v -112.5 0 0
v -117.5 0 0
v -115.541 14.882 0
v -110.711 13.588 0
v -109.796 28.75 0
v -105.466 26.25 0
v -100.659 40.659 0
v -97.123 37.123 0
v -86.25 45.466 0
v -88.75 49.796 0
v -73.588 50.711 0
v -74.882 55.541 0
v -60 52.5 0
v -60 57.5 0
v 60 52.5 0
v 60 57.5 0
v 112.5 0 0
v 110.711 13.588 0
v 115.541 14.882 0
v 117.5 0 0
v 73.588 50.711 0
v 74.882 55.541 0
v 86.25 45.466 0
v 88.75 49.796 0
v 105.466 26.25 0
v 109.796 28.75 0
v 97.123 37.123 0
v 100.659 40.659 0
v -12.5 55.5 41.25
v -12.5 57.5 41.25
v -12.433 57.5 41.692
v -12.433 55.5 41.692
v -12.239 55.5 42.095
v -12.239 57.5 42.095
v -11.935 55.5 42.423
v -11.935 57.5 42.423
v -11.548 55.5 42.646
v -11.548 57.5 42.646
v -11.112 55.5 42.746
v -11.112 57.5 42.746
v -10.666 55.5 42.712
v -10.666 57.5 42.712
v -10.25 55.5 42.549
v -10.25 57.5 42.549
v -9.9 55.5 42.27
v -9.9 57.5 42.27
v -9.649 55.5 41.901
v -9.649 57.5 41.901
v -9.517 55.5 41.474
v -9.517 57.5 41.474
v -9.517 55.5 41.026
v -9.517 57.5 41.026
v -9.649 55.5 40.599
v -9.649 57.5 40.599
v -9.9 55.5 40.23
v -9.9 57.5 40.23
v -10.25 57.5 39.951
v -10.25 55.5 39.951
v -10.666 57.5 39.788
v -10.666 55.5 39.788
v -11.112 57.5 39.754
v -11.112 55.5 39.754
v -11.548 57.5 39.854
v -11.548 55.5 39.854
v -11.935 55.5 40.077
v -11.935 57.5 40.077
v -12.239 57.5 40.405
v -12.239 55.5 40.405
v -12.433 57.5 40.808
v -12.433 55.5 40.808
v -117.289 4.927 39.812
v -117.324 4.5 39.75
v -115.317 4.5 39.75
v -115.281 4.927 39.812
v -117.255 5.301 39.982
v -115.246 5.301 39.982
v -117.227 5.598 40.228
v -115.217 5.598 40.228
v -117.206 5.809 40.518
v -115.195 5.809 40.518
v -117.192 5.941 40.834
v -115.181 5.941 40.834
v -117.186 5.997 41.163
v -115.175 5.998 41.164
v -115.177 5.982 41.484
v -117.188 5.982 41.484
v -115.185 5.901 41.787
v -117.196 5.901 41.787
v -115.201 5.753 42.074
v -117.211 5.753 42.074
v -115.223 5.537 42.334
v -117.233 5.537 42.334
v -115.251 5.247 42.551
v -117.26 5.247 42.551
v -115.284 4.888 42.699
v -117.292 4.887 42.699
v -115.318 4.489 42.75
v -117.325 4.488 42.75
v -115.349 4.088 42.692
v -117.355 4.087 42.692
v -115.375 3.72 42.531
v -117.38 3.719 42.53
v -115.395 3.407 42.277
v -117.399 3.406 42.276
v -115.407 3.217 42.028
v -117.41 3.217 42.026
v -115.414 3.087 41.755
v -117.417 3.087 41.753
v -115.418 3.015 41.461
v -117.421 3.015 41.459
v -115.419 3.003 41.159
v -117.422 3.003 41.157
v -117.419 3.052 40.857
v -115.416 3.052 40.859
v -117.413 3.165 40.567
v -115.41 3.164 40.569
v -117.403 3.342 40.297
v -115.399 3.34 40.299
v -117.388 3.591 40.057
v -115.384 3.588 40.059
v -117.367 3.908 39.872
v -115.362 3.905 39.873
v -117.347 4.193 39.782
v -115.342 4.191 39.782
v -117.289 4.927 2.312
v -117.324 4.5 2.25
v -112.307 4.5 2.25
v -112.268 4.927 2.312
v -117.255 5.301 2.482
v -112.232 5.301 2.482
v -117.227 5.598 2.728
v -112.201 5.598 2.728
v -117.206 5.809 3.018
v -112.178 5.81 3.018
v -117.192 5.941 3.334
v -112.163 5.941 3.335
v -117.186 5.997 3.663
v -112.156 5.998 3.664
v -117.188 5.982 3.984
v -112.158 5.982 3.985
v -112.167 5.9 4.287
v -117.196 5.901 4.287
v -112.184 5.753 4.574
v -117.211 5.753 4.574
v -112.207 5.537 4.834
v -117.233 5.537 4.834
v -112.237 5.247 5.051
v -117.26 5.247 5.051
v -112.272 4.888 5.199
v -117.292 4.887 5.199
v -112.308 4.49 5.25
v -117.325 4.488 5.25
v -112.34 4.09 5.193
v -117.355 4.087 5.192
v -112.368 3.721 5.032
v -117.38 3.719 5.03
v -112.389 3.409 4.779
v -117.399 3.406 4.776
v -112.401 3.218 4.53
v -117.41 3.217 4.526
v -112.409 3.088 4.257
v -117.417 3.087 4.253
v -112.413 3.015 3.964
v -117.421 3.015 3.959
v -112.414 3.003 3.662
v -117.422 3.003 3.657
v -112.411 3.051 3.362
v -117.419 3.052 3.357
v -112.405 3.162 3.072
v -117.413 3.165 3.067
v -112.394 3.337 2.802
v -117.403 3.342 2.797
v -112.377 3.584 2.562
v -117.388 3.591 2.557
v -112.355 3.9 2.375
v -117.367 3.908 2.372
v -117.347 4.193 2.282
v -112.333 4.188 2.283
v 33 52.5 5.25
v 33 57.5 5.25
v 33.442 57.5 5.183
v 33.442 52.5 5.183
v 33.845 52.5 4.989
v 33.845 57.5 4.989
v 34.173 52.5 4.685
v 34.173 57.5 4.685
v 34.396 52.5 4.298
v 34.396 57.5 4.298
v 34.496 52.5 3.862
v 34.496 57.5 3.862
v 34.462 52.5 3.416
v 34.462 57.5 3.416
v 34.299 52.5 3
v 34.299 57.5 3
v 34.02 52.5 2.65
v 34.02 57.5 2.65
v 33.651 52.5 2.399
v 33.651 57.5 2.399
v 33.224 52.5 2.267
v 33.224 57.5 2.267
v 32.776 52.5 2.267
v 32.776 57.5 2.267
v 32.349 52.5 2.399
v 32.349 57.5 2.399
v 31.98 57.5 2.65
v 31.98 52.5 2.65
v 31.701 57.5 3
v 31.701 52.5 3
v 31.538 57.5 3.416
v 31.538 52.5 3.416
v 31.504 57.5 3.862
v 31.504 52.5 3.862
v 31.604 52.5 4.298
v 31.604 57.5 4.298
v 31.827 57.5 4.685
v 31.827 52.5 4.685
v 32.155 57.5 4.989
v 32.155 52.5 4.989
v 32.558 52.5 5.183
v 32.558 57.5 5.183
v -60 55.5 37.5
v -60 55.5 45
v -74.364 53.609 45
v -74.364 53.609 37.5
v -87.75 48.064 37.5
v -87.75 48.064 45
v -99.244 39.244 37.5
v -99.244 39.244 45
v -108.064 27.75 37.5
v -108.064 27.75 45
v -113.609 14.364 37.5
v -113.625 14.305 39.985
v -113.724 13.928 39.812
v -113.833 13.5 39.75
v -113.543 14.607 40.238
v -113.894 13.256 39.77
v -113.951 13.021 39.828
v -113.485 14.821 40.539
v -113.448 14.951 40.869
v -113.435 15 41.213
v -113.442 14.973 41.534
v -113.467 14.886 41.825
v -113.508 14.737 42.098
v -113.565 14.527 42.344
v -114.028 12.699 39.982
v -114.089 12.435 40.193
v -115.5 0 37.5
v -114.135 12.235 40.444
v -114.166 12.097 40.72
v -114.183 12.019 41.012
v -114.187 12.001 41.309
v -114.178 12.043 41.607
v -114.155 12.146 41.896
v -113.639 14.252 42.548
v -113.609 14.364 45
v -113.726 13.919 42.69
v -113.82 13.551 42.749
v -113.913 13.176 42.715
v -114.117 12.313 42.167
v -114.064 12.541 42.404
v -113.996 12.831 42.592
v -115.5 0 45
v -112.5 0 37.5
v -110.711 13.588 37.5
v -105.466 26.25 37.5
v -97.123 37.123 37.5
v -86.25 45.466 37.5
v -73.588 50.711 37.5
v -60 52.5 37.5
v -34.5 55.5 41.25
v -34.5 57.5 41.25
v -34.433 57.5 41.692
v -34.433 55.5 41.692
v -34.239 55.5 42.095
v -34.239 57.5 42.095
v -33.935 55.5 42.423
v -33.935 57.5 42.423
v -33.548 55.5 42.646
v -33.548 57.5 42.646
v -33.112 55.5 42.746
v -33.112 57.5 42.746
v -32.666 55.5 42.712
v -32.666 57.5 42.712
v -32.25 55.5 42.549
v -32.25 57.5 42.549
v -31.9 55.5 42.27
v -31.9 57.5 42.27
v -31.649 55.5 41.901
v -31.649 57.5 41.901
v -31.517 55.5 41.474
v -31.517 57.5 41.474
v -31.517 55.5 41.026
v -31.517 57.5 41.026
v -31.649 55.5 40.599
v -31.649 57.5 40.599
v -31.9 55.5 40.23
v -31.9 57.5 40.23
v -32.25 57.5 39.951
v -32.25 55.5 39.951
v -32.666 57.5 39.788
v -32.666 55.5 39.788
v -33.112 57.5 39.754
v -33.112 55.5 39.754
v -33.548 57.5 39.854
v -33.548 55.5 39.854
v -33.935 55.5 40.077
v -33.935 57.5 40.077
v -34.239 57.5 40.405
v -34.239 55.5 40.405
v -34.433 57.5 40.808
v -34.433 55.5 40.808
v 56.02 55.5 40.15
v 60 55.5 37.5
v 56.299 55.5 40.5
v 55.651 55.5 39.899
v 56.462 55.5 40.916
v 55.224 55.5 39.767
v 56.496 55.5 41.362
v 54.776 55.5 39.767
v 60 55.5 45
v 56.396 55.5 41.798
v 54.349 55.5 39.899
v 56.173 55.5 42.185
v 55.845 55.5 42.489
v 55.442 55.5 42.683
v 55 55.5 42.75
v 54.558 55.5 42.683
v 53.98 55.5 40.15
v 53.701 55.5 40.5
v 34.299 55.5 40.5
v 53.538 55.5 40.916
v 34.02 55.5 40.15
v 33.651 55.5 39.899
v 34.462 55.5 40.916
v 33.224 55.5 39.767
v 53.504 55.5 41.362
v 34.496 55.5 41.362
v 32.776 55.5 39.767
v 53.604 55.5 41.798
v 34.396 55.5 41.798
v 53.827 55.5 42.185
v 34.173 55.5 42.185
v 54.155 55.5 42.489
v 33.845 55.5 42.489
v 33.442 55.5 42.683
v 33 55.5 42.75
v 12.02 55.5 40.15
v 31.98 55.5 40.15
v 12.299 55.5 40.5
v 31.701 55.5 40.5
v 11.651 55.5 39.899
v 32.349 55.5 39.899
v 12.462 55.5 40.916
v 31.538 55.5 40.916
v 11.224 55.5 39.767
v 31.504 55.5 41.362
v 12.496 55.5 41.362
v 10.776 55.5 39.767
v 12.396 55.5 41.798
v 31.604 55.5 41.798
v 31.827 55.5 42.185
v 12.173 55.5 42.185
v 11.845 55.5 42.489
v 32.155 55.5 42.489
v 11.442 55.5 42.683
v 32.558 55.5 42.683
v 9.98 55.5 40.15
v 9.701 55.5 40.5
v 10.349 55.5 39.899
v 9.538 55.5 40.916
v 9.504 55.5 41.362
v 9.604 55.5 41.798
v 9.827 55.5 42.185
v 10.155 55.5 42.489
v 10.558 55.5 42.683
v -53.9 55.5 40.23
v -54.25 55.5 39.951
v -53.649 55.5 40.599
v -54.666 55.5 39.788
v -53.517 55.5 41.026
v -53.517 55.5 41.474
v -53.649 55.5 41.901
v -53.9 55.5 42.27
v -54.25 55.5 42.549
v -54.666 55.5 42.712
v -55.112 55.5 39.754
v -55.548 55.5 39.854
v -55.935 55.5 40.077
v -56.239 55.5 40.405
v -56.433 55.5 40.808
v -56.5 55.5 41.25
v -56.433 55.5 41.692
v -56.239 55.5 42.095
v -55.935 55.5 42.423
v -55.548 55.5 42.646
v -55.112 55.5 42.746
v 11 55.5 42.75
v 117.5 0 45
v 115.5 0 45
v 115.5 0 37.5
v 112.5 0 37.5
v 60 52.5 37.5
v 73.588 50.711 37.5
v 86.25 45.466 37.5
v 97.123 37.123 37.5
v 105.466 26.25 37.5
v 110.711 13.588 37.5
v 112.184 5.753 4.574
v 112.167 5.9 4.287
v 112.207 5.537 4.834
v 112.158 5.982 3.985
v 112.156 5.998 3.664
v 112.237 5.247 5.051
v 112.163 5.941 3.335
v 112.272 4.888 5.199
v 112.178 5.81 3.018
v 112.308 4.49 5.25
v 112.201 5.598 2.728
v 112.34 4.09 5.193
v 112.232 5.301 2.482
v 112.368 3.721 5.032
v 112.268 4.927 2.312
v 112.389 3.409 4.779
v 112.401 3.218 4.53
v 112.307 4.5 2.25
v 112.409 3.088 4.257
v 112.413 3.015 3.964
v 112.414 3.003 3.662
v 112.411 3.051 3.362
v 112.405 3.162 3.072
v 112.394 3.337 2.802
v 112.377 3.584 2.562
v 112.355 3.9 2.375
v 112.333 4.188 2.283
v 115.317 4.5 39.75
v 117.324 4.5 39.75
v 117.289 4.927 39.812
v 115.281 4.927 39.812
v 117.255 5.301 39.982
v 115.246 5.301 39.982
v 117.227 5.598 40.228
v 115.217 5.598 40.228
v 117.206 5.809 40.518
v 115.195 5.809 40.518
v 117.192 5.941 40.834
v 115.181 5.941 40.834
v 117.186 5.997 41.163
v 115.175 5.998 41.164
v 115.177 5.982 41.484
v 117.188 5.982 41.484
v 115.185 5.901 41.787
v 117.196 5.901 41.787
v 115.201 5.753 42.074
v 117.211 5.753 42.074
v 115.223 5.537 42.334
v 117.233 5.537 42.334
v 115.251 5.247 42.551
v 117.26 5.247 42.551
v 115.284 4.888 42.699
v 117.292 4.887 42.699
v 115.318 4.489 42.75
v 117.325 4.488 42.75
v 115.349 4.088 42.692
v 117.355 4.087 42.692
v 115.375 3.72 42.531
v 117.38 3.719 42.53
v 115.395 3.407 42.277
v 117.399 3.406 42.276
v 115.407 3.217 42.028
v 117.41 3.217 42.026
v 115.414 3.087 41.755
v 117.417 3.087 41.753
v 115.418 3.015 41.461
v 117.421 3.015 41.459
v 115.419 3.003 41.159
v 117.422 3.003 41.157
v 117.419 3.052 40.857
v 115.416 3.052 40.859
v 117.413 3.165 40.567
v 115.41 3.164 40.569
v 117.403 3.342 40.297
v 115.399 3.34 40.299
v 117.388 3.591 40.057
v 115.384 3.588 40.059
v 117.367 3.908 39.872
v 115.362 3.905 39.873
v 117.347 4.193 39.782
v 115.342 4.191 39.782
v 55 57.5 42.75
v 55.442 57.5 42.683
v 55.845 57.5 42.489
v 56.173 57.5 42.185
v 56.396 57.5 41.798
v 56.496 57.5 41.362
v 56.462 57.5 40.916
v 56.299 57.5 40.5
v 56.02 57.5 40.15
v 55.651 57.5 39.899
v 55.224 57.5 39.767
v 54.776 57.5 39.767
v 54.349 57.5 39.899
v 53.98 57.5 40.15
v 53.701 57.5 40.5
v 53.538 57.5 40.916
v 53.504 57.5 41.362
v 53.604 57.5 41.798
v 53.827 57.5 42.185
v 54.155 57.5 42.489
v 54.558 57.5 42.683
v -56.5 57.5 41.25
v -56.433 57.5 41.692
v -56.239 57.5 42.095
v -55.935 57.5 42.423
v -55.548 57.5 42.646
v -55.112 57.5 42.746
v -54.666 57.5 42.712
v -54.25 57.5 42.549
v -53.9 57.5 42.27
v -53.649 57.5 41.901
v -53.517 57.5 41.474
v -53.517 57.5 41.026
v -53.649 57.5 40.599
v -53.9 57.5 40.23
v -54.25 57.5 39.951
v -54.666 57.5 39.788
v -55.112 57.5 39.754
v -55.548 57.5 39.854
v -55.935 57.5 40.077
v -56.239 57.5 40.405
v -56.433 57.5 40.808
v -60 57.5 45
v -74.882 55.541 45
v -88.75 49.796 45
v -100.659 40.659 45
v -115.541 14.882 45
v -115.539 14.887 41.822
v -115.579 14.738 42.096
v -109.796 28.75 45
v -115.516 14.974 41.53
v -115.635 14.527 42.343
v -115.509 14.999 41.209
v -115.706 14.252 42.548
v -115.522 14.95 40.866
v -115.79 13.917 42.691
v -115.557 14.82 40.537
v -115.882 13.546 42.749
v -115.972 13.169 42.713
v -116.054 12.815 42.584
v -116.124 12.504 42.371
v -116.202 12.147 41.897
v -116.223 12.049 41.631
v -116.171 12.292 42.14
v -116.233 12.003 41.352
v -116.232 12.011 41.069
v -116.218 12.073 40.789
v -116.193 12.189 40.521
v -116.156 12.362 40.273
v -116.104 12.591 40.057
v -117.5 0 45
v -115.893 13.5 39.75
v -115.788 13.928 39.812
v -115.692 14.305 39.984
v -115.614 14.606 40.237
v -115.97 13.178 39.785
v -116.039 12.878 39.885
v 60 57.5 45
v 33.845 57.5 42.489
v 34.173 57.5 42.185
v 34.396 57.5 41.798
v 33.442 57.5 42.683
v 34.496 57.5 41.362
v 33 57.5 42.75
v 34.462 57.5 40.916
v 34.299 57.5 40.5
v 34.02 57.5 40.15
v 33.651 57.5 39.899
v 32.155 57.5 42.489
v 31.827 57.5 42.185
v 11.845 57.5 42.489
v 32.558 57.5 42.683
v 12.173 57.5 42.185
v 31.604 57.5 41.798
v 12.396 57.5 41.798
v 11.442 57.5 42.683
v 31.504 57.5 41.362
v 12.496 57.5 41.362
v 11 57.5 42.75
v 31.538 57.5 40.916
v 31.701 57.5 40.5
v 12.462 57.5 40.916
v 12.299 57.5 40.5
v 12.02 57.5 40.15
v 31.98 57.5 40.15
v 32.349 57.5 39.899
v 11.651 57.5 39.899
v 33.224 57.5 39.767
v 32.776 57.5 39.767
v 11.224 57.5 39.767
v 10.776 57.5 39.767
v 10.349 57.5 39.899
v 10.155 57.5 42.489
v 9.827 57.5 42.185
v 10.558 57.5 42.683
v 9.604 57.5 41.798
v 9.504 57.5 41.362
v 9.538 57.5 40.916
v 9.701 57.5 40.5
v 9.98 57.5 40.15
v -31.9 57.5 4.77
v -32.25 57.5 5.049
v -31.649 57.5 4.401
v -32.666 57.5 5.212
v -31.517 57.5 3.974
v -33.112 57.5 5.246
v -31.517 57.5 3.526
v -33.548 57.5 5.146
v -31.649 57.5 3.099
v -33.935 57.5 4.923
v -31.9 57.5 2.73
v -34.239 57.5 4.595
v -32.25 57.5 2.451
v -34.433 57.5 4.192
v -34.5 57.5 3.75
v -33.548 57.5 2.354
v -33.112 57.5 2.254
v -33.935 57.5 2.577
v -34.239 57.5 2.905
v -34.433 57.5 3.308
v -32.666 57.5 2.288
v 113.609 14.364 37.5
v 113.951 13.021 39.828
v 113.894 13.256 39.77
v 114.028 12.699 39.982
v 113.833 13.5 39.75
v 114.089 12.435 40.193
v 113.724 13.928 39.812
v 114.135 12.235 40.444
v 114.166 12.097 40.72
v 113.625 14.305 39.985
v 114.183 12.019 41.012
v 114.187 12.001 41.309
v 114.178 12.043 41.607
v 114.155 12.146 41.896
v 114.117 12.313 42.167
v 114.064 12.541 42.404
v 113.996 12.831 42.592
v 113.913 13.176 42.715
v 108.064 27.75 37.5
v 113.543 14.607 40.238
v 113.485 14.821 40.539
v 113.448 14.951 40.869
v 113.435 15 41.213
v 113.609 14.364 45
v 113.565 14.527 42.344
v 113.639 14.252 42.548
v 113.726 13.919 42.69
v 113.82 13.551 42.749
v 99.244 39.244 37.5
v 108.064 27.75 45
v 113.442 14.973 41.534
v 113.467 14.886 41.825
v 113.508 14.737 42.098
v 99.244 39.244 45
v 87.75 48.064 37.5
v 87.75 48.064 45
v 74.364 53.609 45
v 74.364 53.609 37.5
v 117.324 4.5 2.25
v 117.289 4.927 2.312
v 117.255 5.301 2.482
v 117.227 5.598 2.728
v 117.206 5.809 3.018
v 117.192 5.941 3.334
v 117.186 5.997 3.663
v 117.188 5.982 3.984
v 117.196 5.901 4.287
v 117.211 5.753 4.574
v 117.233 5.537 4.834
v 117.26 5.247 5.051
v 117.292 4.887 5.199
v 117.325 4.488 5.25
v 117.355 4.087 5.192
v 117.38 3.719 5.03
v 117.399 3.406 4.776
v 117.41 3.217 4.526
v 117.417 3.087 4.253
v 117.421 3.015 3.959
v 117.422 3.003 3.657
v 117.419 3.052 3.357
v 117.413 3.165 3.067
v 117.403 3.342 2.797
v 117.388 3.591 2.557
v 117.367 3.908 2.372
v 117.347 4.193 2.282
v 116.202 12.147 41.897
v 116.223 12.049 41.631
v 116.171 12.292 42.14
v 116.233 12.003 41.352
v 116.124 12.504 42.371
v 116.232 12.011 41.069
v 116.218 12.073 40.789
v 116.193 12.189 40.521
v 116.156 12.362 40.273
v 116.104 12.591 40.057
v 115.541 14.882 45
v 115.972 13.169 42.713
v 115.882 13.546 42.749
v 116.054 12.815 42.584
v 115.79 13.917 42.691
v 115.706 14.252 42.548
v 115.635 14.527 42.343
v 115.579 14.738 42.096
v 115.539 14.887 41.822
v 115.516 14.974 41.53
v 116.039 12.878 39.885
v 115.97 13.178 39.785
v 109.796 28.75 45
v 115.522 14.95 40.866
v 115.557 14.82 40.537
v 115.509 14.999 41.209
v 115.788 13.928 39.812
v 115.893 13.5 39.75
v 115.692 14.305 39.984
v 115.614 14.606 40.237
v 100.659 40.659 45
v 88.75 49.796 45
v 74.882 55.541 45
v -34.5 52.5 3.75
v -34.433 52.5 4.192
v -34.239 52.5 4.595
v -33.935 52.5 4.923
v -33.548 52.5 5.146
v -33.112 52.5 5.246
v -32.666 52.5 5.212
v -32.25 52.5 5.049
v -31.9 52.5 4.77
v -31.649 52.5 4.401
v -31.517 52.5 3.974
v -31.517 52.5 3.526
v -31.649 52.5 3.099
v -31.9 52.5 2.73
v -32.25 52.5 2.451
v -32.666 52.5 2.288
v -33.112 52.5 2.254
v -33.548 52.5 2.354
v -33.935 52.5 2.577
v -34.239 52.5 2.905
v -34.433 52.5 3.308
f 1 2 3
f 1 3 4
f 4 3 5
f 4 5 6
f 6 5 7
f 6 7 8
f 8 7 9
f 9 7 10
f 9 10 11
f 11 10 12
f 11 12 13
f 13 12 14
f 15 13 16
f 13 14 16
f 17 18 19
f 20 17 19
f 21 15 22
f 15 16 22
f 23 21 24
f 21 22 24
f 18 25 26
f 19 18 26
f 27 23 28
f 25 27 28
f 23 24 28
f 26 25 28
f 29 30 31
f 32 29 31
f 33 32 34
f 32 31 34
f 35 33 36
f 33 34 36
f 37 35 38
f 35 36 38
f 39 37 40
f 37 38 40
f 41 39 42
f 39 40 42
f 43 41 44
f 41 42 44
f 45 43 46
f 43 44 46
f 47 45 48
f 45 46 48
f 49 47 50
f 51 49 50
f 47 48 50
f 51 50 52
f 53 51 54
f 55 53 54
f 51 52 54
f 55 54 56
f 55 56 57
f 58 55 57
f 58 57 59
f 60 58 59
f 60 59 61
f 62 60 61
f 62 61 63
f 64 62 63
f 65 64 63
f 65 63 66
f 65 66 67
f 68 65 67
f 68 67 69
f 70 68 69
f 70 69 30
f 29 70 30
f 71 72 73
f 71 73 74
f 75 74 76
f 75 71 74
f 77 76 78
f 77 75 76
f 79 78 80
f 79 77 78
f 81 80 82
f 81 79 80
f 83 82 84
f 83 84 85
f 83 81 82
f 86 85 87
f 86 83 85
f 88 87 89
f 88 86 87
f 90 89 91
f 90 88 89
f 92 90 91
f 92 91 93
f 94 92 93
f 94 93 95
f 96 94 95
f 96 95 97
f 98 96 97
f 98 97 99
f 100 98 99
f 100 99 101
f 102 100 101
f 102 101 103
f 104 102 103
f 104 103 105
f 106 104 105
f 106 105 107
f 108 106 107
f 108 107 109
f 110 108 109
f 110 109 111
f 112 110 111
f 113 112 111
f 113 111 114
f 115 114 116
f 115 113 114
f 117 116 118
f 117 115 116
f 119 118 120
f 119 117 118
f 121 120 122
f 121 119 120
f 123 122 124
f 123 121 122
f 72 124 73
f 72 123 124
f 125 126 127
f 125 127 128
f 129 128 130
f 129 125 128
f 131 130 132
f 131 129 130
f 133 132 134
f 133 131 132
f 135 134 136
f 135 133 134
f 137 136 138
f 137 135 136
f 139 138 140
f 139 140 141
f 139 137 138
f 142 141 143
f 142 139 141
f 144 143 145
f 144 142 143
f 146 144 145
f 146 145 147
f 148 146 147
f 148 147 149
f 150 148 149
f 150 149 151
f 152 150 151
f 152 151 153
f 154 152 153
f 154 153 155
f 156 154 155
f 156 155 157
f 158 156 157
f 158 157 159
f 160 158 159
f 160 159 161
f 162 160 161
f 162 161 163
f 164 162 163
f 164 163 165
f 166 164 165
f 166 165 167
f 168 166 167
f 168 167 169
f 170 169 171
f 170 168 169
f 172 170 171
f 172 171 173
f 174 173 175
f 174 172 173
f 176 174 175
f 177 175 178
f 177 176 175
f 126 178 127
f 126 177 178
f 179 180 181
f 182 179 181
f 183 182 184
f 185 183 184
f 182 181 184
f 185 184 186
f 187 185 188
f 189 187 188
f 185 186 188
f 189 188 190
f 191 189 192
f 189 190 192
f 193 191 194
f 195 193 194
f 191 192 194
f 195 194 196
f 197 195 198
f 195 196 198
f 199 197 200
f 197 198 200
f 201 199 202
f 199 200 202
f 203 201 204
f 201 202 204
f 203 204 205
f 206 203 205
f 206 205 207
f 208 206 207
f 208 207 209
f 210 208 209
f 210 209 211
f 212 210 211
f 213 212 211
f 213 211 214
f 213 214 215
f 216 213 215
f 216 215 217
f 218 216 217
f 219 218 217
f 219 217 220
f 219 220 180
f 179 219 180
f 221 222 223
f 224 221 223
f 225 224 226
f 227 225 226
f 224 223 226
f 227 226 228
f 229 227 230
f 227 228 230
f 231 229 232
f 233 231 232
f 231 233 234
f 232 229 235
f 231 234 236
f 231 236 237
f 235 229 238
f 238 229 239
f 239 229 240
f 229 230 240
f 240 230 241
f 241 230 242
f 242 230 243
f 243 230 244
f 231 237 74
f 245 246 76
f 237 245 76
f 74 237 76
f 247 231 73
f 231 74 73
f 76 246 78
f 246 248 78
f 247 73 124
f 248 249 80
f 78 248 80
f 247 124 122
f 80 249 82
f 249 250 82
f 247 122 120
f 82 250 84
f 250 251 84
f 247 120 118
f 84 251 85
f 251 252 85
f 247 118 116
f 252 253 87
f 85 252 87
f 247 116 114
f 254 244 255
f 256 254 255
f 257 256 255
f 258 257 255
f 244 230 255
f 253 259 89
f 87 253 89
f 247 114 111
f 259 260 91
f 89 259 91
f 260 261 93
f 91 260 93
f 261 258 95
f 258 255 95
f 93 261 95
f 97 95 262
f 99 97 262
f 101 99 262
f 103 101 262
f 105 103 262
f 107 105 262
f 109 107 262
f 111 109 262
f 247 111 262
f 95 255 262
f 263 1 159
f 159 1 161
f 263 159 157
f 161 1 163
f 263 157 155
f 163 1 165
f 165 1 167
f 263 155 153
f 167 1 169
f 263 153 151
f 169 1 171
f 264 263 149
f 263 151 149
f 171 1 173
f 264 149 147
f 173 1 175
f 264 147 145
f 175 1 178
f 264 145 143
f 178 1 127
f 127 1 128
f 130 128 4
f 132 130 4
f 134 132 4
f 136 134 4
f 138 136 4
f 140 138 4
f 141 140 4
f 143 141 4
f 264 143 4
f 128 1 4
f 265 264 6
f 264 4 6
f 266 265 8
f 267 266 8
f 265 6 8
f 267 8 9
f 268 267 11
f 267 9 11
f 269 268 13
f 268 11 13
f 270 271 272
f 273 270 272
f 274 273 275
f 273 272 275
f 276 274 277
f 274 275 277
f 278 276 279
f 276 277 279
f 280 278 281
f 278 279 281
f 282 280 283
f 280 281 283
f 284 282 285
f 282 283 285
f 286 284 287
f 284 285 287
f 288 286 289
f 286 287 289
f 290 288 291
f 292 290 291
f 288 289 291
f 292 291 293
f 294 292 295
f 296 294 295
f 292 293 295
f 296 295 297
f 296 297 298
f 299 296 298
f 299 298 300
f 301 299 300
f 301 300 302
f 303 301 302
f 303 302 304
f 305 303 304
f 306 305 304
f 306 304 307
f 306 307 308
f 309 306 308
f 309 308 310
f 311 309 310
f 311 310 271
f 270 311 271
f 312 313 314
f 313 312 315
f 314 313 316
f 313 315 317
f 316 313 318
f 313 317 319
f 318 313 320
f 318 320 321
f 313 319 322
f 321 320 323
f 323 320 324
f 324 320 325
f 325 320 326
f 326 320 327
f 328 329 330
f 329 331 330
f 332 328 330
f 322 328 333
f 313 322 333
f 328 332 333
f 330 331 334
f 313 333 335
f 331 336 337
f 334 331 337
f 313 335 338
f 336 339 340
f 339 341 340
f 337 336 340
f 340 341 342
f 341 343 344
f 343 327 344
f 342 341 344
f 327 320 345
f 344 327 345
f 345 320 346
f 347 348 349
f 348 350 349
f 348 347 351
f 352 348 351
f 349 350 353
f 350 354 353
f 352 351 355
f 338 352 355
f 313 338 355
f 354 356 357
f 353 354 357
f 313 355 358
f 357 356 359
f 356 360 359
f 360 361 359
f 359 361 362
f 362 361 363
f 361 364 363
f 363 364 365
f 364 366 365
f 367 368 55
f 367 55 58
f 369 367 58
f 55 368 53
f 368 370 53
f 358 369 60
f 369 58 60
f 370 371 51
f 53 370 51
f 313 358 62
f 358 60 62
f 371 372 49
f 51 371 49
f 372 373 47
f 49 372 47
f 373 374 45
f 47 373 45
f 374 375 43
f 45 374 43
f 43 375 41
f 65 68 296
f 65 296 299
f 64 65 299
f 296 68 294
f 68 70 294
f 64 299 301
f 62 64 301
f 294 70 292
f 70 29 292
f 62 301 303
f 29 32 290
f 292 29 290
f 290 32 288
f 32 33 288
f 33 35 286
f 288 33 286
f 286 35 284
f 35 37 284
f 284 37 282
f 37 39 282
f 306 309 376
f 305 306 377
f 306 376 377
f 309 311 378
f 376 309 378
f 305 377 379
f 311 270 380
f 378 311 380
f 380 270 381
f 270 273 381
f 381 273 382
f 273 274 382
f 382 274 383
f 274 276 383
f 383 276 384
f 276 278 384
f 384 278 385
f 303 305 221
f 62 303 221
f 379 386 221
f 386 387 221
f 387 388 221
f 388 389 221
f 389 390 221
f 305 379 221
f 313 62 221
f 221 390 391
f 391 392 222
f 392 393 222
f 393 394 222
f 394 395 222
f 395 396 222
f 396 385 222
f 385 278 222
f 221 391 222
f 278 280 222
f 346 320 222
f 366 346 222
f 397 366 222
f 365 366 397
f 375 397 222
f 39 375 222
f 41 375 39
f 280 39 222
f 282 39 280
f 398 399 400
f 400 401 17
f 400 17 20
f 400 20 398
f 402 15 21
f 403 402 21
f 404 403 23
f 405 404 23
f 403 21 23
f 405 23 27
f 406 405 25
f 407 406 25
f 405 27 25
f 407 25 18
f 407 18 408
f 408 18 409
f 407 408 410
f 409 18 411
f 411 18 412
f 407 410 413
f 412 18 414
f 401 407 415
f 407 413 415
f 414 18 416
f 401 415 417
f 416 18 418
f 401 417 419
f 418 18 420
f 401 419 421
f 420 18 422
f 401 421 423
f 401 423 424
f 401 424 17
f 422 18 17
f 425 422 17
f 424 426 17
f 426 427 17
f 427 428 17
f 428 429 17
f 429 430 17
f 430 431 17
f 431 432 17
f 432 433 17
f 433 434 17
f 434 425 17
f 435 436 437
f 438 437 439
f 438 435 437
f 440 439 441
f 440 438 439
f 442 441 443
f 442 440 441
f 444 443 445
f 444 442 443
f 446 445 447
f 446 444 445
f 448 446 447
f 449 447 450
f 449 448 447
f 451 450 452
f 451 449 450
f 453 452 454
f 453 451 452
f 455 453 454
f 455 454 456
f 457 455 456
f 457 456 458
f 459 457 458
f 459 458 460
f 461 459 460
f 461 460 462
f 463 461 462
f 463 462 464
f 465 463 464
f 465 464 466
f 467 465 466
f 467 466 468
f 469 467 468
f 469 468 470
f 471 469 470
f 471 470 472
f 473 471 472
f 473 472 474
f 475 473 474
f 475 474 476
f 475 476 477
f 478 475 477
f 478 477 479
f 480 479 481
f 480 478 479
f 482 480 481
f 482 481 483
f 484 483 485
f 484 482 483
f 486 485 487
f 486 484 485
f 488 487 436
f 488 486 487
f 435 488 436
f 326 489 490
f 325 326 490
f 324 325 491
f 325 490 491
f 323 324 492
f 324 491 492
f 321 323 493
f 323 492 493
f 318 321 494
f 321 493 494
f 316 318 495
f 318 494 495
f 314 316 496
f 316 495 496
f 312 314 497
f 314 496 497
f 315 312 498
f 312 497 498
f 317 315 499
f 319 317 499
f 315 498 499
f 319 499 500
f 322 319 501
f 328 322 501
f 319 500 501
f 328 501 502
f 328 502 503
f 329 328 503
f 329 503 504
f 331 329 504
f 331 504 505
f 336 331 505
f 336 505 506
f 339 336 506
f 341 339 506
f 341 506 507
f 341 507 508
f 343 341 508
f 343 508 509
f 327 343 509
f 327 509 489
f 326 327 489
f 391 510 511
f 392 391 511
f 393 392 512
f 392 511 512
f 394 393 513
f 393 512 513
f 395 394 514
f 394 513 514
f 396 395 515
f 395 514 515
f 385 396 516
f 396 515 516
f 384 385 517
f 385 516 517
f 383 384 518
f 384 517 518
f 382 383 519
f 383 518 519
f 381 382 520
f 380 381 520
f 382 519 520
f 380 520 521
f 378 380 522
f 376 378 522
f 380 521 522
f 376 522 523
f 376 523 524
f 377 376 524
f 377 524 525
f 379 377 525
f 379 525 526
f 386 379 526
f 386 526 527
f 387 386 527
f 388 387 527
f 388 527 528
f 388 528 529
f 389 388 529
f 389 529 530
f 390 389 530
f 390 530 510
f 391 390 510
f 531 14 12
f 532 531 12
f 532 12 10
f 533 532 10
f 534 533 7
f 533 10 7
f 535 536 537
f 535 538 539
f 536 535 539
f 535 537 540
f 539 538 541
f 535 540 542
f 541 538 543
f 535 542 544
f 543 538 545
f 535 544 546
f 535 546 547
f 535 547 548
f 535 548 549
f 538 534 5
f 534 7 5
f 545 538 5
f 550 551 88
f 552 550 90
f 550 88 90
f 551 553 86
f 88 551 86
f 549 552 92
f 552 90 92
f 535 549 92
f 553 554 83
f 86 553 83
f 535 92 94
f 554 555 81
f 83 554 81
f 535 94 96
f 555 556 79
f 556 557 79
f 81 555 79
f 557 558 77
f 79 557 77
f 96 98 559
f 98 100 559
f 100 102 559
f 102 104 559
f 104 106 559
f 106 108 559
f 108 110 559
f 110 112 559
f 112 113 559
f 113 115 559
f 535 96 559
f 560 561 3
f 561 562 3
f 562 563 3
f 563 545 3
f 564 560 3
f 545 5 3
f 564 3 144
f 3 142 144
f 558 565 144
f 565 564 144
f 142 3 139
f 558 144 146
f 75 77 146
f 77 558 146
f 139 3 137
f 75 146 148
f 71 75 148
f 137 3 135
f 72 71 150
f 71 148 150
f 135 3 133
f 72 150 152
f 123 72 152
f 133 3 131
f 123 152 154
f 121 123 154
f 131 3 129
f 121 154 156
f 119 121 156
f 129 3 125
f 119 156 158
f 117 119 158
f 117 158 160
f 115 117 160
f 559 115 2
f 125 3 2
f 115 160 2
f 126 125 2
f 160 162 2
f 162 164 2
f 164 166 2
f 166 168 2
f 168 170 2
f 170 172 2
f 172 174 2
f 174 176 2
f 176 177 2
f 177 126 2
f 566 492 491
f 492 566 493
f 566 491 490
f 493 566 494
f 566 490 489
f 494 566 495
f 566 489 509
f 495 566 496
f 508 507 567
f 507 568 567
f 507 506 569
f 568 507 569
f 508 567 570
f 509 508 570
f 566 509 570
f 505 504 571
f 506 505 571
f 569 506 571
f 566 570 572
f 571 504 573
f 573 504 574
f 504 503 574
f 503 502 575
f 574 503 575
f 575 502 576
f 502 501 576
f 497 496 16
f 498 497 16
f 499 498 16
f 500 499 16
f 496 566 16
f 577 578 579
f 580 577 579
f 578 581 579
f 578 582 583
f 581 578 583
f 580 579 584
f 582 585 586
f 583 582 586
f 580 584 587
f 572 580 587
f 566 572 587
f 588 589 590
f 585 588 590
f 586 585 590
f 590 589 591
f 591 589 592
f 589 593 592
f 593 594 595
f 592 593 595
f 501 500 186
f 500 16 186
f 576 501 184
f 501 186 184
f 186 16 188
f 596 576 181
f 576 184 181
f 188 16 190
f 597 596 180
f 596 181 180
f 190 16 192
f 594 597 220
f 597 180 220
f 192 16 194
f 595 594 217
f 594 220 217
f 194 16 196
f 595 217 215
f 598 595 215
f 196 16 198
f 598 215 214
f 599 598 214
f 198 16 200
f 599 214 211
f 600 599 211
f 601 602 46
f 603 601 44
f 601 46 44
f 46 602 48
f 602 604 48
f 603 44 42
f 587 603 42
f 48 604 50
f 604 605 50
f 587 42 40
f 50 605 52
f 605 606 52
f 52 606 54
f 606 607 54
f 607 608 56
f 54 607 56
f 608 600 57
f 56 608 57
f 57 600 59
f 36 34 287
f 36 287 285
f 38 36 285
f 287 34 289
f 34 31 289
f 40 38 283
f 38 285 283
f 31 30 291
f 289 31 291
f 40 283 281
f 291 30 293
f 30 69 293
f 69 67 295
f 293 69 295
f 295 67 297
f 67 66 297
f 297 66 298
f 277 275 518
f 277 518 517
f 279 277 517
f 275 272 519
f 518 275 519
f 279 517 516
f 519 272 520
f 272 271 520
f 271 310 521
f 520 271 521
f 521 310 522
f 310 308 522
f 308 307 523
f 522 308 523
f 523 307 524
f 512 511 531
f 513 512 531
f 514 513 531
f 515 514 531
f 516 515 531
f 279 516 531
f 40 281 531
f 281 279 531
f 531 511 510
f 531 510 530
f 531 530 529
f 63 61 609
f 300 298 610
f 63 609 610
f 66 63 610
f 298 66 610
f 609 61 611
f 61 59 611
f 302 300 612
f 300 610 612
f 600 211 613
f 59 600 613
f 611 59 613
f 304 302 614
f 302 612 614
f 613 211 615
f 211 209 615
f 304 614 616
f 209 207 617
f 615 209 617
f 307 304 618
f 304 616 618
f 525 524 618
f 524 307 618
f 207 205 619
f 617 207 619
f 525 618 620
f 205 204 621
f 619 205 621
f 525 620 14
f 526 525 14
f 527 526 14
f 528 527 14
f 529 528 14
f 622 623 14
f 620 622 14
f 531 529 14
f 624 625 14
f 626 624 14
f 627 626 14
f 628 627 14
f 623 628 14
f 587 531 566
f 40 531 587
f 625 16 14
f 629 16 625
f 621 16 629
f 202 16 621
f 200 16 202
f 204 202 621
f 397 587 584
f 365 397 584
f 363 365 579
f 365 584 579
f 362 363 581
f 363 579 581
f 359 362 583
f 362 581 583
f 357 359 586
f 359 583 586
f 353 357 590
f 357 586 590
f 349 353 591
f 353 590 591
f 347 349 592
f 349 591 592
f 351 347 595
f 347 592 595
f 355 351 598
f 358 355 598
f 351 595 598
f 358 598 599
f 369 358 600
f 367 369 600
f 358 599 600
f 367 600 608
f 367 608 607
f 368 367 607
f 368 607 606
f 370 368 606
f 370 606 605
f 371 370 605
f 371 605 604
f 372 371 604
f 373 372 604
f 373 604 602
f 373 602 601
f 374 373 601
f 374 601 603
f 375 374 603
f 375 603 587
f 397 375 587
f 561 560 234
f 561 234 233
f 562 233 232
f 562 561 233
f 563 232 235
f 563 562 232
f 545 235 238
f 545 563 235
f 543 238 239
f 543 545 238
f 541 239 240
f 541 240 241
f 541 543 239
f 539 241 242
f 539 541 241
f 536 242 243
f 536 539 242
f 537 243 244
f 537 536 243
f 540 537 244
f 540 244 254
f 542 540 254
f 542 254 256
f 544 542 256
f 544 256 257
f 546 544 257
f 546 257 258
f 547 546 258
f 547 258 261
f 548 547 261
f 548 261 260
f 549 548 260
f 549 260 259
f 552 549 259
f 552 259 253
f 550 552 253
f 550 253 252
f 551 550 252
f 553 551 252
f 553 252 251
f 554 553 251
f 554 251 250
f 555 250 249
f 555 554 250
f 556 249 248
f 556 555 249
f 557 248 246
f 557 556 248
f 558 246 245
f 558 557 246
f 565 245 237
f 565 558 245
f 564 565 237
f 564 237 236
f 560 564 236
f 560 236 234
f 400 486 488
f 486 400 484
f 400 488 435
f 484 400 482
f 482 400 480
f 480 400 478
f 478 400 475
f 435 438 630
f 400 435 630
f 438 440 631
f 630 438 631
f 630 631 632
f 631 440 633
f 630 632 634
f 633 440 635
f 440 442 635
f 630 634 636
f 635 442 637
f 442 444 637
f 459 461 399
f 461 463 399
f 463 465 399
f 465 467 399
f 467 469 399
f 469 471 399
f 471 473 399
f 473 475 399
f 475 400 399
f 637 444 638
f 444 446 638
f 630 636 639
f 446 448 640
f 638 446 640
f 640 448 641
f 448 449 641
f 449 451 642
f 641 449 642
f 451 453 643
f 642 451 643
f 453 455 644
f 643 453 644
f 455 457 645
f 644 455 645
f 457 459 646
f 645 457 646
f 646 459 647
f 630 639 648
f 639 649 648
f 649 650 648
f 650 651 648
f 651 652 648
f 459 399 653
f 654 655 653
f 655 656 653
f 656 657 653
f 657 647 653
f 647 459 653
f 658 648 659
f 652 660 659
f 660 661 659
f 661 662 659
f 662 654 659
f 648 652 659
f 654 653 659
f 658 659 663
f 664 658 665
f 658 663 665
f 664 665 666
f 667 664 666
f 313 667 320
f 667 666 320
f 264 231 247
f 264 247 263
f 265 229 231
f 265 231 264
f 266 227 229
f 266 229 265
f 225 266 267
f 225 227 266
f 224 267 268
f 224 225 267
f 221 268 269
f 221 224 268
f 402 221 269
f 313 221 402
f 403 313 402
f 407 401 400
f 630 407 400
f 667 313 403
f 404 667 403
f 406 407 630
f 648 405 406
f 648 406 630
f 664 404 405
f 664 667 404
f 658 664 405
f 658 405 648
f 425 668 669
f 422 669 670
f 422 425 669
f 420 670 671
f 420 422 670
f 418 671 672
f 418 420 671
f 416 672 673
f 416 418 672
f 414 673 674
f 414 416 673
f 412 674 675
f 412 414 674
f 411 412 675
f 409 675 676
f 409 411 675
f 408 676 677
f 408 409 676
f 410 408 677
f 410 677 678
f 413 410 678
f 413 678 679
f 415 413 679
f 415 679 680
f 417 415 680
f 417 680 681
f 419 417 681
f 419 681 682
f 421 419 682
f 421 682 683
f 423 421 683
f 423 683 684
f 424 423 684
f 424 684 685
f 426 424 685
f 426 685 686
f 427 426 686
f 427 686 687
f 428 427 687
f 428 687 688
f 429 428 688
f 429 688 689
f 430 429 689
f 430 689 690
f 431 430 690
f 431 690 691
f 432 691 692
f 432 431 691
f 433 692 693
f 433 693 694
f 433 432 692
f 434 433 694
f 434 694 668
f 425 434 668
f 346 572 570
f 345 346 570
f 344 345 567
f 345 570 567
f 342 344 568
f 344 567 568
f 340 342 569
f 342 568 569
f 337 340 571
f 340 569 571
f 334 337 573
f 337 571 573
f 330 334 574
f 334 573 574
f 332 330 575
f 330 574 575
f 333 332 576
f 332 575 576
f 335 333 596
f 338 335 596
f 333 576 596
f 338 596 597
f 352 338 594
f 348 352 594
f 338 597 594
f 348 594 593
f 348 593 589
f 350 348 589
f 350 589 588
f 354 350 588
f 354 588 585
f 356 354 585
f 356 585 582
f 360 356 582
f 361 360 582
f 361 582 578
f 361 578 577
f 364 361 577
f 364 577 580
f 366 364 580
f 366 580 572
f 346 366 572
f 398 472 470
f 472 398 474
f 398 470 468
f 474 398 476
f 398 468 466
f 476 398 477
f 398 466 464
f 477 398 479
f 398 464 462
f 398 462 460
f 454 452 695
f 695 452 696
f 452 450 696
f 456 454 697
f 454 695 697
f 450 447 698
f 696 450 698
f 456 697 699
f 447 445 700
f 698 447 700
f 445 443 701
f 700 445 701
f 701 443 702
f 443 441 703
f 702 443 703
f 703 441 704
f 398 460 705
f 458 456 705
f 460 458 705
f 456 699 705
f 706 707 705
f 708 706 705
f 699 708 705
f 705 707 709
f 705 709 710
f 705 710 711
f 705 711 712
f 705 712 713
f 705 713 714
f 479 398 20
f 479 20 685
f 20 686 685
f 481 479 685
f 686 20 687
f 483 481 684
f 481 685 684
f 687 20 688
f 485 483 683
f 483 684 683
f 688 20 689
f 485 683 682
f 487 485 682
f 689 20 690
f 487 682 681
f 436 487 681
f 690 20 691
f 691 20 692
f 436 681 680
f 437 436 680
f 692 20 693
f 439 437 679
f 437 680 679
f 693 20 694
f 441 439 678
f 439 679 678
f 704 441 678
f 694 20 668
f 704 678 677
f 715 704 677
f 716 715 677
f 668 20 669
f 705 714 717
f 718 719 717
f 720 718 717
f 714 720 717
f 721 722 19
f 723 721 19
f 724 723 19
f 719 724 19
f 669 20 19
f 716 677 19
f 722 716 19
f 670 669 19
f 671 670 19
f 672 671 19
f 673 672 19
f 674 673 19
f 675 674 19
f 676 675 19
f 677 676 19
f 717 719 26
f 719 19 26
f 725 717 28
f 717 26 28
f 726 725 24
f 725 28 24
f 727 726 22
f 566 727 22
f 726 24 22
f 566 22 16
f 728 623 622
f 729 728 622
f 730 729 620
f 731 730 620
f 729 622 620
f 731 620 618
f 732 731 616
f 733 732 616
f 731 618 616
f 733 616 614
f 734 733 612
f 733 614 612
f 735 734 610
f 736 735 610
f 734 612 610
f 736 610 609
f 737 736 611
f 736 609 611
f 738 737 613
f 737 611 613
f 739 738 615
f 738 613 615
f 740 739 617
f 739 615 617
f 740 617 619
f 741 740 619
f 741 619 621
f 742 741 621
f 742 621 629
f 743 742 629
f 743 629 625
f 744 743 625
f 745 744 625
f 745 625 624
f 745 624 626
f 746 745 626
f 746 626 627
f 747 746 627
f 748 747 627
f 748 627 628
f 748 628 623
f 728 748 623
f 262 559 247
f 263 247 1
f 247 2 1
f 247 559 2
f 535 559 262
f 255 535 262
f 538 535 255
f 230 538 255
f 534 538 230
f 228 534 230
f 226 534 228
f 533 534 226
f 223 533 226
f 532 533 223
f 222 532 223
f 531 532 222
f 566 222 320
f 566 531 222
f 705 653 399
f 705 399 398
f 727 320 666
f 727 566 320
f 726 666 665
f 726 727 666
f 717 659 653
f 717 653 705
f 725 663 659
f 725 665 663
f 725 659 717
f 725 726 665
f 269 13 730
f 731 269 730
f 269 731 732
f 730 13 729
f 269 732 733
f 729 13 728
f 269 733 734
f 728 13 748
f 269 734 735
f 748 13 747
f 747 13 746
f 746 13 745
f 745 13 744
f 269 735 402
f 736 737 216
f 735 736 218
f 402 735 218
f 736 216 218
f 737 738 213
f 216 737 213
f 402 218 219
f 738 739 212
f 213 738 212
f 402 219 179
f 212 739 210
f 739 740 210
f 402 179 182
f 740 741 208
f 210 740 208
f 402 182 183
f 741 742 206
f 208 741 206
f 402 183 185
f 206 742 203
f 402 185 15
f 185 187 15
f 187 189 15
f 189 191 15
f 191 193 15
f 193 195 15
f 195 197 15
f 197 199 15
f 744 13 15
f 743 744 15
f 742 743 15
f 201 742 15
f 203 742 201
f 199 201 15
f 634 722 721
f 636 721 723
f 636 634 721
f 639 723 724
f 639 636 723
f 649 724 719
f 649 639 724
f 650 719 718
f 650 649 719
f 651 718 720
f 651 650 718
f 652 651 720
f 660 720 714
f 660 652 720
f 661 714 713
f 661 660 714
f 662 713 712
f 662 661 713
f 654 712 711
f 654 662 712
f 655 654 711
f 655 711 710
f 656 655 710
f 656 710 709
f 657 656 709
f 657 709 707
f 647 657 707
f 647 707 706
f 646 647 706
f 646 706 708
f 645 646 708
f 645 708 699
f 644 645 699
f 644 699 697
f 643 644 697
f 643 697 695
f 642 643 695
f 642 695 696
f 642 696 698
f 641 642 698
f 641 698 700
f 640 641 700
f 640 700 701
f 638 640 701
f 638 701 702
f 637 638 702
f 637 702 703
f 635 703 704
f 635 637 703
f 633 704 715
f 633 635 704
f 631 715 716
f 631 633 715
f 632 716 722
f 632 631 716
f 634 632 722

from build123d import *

# Parameters (mm, degrees)
BOSS_EXTRUDE1_DEPTH     = 45
CUT_EXTRUDE1_DEPTH      = 7.5
SKETCH4_R               = 1.5
CUT_EXTRUDE2_DEPTH      = 7.5
CUT_EXTRUDE3_DEPTH      = 139.338353323
CUT_EXTRUDE3_DEPTH_BACK = 139.338353323
SKETCH5_R               = 1.5


with BuildPart() as part:
    # Sketch1 → Boss-Extrude1 (new body)
    with BuildSketch(Plane.XY):
        with BuildLine():
            ThreePointArc((-112.5, 0), (-97.123106012, 37.123106012), (-60, 52.5))
            Line((-60, 52.5), (60, 52.5))
            ThreePointArc((60, 52.5), (97.123106012, 37.123106012), (112.5, 0))
            Line((112.5, 0), (117.5, 0))
            ThreePointArc((117.5, 0), (100.658639918, 40.658639918), (60, 57.5))
            Line((60, 57.5), (-60, 57.5))
            ThreePointArc((-60, 57.5), (-100.658639918, 40.658639918), (-117.5, 0))
            Line((-117.5, 0), (-112.5, 0))
        make_face()
    extrude(amount=BOSS_EXTRUDE1_DEPTH)

    # Sketch3 → Cut-Extrude1 (cut)
    with BuildSketch(Plane.XY.offset(45)):
        with BuildLine():
            Line((-115.5, 0), (115.5, 0))
            ThreePointArc((115.5, 0), (99.244426356, 39.244426356), (60, 55.5))
            Line((60, 55.5), (-60, 55.5))
            ThreePointArc((-60, 55.5), (-99.244426356, 39.244426356), (-115.5, 0))
        make_face()
    extrude(amount=-CUT_EXTRUDE1_DEPTH, mode=Mode.SUBTRACT)

    # Sketch4 → Cut-Extrude2 (cut)
    with BuildSketch(Plane(origin=(0, 57.5, 0), x_dir=(1, 0, 0), z_dir=(0, 1, 0))):
        with Locations(Location((33, -3.75, 0), (0, 0, 270))):
            Circle(SKETCH4_R)
        with Locations(Location((11, -41.25, 0), (0, 0, 270))):
            Circle(SKETCH4_R)
        with Locations(Location((33, -41.25, 0), (0, 0, 270))):
            Circle(SKETCH4_R)
        with Locations(Location((55, -41.25, 0), (0, 0, 270))):
            Circle(SKETCH4_R)
        with Locations(Location((-33, -3.75, 0), (0, 0, 180))):
            Circle(SKETCH4_R)
        with Locations(Location((-11, -41.25, 0), (0, 0, 180))):
            Circle(SKETCH4_R)
        with Locations(Location((-33, -41.25, 0), (0, 0, 180))):
            Circle(SKETCH4_R)
        with Locations(Location((-55, -41.25, 0), (0, 0, 180))):
            Circle(SKETCH4_R)
    extrude(amount=-CUT_EXTRUDE2_DEPTH, mode=Mode.SUBTRACT)

    # Sketch5 → Cut-Extrude3 (cut, two sides: drawn at the far end of the back side and taken through both)
    with BuildSketch(Plane(origin=(0, 0, 0), x_dir=(0, 0, -1), z_dir=(1, 0, 0)).offset(-CUT_EXTRUDE3_DEPTH_BACK)):
        with Locations((-3.75, 4.5)):
            Circle(SKETCH5_R)
        with Locations((-41.25, 4.5)):
            Circle(SKETCH5_R)
        with Locations((-41.25, 13.5)):
            Circle(SKETCH5_R)
    extrude(amount=CUT_EXTRUDE3_DEPTH + CUT_EXTRUDE3_DEPTH_BACK, mode=Mode.SUBTRACT)


solid = part.part
